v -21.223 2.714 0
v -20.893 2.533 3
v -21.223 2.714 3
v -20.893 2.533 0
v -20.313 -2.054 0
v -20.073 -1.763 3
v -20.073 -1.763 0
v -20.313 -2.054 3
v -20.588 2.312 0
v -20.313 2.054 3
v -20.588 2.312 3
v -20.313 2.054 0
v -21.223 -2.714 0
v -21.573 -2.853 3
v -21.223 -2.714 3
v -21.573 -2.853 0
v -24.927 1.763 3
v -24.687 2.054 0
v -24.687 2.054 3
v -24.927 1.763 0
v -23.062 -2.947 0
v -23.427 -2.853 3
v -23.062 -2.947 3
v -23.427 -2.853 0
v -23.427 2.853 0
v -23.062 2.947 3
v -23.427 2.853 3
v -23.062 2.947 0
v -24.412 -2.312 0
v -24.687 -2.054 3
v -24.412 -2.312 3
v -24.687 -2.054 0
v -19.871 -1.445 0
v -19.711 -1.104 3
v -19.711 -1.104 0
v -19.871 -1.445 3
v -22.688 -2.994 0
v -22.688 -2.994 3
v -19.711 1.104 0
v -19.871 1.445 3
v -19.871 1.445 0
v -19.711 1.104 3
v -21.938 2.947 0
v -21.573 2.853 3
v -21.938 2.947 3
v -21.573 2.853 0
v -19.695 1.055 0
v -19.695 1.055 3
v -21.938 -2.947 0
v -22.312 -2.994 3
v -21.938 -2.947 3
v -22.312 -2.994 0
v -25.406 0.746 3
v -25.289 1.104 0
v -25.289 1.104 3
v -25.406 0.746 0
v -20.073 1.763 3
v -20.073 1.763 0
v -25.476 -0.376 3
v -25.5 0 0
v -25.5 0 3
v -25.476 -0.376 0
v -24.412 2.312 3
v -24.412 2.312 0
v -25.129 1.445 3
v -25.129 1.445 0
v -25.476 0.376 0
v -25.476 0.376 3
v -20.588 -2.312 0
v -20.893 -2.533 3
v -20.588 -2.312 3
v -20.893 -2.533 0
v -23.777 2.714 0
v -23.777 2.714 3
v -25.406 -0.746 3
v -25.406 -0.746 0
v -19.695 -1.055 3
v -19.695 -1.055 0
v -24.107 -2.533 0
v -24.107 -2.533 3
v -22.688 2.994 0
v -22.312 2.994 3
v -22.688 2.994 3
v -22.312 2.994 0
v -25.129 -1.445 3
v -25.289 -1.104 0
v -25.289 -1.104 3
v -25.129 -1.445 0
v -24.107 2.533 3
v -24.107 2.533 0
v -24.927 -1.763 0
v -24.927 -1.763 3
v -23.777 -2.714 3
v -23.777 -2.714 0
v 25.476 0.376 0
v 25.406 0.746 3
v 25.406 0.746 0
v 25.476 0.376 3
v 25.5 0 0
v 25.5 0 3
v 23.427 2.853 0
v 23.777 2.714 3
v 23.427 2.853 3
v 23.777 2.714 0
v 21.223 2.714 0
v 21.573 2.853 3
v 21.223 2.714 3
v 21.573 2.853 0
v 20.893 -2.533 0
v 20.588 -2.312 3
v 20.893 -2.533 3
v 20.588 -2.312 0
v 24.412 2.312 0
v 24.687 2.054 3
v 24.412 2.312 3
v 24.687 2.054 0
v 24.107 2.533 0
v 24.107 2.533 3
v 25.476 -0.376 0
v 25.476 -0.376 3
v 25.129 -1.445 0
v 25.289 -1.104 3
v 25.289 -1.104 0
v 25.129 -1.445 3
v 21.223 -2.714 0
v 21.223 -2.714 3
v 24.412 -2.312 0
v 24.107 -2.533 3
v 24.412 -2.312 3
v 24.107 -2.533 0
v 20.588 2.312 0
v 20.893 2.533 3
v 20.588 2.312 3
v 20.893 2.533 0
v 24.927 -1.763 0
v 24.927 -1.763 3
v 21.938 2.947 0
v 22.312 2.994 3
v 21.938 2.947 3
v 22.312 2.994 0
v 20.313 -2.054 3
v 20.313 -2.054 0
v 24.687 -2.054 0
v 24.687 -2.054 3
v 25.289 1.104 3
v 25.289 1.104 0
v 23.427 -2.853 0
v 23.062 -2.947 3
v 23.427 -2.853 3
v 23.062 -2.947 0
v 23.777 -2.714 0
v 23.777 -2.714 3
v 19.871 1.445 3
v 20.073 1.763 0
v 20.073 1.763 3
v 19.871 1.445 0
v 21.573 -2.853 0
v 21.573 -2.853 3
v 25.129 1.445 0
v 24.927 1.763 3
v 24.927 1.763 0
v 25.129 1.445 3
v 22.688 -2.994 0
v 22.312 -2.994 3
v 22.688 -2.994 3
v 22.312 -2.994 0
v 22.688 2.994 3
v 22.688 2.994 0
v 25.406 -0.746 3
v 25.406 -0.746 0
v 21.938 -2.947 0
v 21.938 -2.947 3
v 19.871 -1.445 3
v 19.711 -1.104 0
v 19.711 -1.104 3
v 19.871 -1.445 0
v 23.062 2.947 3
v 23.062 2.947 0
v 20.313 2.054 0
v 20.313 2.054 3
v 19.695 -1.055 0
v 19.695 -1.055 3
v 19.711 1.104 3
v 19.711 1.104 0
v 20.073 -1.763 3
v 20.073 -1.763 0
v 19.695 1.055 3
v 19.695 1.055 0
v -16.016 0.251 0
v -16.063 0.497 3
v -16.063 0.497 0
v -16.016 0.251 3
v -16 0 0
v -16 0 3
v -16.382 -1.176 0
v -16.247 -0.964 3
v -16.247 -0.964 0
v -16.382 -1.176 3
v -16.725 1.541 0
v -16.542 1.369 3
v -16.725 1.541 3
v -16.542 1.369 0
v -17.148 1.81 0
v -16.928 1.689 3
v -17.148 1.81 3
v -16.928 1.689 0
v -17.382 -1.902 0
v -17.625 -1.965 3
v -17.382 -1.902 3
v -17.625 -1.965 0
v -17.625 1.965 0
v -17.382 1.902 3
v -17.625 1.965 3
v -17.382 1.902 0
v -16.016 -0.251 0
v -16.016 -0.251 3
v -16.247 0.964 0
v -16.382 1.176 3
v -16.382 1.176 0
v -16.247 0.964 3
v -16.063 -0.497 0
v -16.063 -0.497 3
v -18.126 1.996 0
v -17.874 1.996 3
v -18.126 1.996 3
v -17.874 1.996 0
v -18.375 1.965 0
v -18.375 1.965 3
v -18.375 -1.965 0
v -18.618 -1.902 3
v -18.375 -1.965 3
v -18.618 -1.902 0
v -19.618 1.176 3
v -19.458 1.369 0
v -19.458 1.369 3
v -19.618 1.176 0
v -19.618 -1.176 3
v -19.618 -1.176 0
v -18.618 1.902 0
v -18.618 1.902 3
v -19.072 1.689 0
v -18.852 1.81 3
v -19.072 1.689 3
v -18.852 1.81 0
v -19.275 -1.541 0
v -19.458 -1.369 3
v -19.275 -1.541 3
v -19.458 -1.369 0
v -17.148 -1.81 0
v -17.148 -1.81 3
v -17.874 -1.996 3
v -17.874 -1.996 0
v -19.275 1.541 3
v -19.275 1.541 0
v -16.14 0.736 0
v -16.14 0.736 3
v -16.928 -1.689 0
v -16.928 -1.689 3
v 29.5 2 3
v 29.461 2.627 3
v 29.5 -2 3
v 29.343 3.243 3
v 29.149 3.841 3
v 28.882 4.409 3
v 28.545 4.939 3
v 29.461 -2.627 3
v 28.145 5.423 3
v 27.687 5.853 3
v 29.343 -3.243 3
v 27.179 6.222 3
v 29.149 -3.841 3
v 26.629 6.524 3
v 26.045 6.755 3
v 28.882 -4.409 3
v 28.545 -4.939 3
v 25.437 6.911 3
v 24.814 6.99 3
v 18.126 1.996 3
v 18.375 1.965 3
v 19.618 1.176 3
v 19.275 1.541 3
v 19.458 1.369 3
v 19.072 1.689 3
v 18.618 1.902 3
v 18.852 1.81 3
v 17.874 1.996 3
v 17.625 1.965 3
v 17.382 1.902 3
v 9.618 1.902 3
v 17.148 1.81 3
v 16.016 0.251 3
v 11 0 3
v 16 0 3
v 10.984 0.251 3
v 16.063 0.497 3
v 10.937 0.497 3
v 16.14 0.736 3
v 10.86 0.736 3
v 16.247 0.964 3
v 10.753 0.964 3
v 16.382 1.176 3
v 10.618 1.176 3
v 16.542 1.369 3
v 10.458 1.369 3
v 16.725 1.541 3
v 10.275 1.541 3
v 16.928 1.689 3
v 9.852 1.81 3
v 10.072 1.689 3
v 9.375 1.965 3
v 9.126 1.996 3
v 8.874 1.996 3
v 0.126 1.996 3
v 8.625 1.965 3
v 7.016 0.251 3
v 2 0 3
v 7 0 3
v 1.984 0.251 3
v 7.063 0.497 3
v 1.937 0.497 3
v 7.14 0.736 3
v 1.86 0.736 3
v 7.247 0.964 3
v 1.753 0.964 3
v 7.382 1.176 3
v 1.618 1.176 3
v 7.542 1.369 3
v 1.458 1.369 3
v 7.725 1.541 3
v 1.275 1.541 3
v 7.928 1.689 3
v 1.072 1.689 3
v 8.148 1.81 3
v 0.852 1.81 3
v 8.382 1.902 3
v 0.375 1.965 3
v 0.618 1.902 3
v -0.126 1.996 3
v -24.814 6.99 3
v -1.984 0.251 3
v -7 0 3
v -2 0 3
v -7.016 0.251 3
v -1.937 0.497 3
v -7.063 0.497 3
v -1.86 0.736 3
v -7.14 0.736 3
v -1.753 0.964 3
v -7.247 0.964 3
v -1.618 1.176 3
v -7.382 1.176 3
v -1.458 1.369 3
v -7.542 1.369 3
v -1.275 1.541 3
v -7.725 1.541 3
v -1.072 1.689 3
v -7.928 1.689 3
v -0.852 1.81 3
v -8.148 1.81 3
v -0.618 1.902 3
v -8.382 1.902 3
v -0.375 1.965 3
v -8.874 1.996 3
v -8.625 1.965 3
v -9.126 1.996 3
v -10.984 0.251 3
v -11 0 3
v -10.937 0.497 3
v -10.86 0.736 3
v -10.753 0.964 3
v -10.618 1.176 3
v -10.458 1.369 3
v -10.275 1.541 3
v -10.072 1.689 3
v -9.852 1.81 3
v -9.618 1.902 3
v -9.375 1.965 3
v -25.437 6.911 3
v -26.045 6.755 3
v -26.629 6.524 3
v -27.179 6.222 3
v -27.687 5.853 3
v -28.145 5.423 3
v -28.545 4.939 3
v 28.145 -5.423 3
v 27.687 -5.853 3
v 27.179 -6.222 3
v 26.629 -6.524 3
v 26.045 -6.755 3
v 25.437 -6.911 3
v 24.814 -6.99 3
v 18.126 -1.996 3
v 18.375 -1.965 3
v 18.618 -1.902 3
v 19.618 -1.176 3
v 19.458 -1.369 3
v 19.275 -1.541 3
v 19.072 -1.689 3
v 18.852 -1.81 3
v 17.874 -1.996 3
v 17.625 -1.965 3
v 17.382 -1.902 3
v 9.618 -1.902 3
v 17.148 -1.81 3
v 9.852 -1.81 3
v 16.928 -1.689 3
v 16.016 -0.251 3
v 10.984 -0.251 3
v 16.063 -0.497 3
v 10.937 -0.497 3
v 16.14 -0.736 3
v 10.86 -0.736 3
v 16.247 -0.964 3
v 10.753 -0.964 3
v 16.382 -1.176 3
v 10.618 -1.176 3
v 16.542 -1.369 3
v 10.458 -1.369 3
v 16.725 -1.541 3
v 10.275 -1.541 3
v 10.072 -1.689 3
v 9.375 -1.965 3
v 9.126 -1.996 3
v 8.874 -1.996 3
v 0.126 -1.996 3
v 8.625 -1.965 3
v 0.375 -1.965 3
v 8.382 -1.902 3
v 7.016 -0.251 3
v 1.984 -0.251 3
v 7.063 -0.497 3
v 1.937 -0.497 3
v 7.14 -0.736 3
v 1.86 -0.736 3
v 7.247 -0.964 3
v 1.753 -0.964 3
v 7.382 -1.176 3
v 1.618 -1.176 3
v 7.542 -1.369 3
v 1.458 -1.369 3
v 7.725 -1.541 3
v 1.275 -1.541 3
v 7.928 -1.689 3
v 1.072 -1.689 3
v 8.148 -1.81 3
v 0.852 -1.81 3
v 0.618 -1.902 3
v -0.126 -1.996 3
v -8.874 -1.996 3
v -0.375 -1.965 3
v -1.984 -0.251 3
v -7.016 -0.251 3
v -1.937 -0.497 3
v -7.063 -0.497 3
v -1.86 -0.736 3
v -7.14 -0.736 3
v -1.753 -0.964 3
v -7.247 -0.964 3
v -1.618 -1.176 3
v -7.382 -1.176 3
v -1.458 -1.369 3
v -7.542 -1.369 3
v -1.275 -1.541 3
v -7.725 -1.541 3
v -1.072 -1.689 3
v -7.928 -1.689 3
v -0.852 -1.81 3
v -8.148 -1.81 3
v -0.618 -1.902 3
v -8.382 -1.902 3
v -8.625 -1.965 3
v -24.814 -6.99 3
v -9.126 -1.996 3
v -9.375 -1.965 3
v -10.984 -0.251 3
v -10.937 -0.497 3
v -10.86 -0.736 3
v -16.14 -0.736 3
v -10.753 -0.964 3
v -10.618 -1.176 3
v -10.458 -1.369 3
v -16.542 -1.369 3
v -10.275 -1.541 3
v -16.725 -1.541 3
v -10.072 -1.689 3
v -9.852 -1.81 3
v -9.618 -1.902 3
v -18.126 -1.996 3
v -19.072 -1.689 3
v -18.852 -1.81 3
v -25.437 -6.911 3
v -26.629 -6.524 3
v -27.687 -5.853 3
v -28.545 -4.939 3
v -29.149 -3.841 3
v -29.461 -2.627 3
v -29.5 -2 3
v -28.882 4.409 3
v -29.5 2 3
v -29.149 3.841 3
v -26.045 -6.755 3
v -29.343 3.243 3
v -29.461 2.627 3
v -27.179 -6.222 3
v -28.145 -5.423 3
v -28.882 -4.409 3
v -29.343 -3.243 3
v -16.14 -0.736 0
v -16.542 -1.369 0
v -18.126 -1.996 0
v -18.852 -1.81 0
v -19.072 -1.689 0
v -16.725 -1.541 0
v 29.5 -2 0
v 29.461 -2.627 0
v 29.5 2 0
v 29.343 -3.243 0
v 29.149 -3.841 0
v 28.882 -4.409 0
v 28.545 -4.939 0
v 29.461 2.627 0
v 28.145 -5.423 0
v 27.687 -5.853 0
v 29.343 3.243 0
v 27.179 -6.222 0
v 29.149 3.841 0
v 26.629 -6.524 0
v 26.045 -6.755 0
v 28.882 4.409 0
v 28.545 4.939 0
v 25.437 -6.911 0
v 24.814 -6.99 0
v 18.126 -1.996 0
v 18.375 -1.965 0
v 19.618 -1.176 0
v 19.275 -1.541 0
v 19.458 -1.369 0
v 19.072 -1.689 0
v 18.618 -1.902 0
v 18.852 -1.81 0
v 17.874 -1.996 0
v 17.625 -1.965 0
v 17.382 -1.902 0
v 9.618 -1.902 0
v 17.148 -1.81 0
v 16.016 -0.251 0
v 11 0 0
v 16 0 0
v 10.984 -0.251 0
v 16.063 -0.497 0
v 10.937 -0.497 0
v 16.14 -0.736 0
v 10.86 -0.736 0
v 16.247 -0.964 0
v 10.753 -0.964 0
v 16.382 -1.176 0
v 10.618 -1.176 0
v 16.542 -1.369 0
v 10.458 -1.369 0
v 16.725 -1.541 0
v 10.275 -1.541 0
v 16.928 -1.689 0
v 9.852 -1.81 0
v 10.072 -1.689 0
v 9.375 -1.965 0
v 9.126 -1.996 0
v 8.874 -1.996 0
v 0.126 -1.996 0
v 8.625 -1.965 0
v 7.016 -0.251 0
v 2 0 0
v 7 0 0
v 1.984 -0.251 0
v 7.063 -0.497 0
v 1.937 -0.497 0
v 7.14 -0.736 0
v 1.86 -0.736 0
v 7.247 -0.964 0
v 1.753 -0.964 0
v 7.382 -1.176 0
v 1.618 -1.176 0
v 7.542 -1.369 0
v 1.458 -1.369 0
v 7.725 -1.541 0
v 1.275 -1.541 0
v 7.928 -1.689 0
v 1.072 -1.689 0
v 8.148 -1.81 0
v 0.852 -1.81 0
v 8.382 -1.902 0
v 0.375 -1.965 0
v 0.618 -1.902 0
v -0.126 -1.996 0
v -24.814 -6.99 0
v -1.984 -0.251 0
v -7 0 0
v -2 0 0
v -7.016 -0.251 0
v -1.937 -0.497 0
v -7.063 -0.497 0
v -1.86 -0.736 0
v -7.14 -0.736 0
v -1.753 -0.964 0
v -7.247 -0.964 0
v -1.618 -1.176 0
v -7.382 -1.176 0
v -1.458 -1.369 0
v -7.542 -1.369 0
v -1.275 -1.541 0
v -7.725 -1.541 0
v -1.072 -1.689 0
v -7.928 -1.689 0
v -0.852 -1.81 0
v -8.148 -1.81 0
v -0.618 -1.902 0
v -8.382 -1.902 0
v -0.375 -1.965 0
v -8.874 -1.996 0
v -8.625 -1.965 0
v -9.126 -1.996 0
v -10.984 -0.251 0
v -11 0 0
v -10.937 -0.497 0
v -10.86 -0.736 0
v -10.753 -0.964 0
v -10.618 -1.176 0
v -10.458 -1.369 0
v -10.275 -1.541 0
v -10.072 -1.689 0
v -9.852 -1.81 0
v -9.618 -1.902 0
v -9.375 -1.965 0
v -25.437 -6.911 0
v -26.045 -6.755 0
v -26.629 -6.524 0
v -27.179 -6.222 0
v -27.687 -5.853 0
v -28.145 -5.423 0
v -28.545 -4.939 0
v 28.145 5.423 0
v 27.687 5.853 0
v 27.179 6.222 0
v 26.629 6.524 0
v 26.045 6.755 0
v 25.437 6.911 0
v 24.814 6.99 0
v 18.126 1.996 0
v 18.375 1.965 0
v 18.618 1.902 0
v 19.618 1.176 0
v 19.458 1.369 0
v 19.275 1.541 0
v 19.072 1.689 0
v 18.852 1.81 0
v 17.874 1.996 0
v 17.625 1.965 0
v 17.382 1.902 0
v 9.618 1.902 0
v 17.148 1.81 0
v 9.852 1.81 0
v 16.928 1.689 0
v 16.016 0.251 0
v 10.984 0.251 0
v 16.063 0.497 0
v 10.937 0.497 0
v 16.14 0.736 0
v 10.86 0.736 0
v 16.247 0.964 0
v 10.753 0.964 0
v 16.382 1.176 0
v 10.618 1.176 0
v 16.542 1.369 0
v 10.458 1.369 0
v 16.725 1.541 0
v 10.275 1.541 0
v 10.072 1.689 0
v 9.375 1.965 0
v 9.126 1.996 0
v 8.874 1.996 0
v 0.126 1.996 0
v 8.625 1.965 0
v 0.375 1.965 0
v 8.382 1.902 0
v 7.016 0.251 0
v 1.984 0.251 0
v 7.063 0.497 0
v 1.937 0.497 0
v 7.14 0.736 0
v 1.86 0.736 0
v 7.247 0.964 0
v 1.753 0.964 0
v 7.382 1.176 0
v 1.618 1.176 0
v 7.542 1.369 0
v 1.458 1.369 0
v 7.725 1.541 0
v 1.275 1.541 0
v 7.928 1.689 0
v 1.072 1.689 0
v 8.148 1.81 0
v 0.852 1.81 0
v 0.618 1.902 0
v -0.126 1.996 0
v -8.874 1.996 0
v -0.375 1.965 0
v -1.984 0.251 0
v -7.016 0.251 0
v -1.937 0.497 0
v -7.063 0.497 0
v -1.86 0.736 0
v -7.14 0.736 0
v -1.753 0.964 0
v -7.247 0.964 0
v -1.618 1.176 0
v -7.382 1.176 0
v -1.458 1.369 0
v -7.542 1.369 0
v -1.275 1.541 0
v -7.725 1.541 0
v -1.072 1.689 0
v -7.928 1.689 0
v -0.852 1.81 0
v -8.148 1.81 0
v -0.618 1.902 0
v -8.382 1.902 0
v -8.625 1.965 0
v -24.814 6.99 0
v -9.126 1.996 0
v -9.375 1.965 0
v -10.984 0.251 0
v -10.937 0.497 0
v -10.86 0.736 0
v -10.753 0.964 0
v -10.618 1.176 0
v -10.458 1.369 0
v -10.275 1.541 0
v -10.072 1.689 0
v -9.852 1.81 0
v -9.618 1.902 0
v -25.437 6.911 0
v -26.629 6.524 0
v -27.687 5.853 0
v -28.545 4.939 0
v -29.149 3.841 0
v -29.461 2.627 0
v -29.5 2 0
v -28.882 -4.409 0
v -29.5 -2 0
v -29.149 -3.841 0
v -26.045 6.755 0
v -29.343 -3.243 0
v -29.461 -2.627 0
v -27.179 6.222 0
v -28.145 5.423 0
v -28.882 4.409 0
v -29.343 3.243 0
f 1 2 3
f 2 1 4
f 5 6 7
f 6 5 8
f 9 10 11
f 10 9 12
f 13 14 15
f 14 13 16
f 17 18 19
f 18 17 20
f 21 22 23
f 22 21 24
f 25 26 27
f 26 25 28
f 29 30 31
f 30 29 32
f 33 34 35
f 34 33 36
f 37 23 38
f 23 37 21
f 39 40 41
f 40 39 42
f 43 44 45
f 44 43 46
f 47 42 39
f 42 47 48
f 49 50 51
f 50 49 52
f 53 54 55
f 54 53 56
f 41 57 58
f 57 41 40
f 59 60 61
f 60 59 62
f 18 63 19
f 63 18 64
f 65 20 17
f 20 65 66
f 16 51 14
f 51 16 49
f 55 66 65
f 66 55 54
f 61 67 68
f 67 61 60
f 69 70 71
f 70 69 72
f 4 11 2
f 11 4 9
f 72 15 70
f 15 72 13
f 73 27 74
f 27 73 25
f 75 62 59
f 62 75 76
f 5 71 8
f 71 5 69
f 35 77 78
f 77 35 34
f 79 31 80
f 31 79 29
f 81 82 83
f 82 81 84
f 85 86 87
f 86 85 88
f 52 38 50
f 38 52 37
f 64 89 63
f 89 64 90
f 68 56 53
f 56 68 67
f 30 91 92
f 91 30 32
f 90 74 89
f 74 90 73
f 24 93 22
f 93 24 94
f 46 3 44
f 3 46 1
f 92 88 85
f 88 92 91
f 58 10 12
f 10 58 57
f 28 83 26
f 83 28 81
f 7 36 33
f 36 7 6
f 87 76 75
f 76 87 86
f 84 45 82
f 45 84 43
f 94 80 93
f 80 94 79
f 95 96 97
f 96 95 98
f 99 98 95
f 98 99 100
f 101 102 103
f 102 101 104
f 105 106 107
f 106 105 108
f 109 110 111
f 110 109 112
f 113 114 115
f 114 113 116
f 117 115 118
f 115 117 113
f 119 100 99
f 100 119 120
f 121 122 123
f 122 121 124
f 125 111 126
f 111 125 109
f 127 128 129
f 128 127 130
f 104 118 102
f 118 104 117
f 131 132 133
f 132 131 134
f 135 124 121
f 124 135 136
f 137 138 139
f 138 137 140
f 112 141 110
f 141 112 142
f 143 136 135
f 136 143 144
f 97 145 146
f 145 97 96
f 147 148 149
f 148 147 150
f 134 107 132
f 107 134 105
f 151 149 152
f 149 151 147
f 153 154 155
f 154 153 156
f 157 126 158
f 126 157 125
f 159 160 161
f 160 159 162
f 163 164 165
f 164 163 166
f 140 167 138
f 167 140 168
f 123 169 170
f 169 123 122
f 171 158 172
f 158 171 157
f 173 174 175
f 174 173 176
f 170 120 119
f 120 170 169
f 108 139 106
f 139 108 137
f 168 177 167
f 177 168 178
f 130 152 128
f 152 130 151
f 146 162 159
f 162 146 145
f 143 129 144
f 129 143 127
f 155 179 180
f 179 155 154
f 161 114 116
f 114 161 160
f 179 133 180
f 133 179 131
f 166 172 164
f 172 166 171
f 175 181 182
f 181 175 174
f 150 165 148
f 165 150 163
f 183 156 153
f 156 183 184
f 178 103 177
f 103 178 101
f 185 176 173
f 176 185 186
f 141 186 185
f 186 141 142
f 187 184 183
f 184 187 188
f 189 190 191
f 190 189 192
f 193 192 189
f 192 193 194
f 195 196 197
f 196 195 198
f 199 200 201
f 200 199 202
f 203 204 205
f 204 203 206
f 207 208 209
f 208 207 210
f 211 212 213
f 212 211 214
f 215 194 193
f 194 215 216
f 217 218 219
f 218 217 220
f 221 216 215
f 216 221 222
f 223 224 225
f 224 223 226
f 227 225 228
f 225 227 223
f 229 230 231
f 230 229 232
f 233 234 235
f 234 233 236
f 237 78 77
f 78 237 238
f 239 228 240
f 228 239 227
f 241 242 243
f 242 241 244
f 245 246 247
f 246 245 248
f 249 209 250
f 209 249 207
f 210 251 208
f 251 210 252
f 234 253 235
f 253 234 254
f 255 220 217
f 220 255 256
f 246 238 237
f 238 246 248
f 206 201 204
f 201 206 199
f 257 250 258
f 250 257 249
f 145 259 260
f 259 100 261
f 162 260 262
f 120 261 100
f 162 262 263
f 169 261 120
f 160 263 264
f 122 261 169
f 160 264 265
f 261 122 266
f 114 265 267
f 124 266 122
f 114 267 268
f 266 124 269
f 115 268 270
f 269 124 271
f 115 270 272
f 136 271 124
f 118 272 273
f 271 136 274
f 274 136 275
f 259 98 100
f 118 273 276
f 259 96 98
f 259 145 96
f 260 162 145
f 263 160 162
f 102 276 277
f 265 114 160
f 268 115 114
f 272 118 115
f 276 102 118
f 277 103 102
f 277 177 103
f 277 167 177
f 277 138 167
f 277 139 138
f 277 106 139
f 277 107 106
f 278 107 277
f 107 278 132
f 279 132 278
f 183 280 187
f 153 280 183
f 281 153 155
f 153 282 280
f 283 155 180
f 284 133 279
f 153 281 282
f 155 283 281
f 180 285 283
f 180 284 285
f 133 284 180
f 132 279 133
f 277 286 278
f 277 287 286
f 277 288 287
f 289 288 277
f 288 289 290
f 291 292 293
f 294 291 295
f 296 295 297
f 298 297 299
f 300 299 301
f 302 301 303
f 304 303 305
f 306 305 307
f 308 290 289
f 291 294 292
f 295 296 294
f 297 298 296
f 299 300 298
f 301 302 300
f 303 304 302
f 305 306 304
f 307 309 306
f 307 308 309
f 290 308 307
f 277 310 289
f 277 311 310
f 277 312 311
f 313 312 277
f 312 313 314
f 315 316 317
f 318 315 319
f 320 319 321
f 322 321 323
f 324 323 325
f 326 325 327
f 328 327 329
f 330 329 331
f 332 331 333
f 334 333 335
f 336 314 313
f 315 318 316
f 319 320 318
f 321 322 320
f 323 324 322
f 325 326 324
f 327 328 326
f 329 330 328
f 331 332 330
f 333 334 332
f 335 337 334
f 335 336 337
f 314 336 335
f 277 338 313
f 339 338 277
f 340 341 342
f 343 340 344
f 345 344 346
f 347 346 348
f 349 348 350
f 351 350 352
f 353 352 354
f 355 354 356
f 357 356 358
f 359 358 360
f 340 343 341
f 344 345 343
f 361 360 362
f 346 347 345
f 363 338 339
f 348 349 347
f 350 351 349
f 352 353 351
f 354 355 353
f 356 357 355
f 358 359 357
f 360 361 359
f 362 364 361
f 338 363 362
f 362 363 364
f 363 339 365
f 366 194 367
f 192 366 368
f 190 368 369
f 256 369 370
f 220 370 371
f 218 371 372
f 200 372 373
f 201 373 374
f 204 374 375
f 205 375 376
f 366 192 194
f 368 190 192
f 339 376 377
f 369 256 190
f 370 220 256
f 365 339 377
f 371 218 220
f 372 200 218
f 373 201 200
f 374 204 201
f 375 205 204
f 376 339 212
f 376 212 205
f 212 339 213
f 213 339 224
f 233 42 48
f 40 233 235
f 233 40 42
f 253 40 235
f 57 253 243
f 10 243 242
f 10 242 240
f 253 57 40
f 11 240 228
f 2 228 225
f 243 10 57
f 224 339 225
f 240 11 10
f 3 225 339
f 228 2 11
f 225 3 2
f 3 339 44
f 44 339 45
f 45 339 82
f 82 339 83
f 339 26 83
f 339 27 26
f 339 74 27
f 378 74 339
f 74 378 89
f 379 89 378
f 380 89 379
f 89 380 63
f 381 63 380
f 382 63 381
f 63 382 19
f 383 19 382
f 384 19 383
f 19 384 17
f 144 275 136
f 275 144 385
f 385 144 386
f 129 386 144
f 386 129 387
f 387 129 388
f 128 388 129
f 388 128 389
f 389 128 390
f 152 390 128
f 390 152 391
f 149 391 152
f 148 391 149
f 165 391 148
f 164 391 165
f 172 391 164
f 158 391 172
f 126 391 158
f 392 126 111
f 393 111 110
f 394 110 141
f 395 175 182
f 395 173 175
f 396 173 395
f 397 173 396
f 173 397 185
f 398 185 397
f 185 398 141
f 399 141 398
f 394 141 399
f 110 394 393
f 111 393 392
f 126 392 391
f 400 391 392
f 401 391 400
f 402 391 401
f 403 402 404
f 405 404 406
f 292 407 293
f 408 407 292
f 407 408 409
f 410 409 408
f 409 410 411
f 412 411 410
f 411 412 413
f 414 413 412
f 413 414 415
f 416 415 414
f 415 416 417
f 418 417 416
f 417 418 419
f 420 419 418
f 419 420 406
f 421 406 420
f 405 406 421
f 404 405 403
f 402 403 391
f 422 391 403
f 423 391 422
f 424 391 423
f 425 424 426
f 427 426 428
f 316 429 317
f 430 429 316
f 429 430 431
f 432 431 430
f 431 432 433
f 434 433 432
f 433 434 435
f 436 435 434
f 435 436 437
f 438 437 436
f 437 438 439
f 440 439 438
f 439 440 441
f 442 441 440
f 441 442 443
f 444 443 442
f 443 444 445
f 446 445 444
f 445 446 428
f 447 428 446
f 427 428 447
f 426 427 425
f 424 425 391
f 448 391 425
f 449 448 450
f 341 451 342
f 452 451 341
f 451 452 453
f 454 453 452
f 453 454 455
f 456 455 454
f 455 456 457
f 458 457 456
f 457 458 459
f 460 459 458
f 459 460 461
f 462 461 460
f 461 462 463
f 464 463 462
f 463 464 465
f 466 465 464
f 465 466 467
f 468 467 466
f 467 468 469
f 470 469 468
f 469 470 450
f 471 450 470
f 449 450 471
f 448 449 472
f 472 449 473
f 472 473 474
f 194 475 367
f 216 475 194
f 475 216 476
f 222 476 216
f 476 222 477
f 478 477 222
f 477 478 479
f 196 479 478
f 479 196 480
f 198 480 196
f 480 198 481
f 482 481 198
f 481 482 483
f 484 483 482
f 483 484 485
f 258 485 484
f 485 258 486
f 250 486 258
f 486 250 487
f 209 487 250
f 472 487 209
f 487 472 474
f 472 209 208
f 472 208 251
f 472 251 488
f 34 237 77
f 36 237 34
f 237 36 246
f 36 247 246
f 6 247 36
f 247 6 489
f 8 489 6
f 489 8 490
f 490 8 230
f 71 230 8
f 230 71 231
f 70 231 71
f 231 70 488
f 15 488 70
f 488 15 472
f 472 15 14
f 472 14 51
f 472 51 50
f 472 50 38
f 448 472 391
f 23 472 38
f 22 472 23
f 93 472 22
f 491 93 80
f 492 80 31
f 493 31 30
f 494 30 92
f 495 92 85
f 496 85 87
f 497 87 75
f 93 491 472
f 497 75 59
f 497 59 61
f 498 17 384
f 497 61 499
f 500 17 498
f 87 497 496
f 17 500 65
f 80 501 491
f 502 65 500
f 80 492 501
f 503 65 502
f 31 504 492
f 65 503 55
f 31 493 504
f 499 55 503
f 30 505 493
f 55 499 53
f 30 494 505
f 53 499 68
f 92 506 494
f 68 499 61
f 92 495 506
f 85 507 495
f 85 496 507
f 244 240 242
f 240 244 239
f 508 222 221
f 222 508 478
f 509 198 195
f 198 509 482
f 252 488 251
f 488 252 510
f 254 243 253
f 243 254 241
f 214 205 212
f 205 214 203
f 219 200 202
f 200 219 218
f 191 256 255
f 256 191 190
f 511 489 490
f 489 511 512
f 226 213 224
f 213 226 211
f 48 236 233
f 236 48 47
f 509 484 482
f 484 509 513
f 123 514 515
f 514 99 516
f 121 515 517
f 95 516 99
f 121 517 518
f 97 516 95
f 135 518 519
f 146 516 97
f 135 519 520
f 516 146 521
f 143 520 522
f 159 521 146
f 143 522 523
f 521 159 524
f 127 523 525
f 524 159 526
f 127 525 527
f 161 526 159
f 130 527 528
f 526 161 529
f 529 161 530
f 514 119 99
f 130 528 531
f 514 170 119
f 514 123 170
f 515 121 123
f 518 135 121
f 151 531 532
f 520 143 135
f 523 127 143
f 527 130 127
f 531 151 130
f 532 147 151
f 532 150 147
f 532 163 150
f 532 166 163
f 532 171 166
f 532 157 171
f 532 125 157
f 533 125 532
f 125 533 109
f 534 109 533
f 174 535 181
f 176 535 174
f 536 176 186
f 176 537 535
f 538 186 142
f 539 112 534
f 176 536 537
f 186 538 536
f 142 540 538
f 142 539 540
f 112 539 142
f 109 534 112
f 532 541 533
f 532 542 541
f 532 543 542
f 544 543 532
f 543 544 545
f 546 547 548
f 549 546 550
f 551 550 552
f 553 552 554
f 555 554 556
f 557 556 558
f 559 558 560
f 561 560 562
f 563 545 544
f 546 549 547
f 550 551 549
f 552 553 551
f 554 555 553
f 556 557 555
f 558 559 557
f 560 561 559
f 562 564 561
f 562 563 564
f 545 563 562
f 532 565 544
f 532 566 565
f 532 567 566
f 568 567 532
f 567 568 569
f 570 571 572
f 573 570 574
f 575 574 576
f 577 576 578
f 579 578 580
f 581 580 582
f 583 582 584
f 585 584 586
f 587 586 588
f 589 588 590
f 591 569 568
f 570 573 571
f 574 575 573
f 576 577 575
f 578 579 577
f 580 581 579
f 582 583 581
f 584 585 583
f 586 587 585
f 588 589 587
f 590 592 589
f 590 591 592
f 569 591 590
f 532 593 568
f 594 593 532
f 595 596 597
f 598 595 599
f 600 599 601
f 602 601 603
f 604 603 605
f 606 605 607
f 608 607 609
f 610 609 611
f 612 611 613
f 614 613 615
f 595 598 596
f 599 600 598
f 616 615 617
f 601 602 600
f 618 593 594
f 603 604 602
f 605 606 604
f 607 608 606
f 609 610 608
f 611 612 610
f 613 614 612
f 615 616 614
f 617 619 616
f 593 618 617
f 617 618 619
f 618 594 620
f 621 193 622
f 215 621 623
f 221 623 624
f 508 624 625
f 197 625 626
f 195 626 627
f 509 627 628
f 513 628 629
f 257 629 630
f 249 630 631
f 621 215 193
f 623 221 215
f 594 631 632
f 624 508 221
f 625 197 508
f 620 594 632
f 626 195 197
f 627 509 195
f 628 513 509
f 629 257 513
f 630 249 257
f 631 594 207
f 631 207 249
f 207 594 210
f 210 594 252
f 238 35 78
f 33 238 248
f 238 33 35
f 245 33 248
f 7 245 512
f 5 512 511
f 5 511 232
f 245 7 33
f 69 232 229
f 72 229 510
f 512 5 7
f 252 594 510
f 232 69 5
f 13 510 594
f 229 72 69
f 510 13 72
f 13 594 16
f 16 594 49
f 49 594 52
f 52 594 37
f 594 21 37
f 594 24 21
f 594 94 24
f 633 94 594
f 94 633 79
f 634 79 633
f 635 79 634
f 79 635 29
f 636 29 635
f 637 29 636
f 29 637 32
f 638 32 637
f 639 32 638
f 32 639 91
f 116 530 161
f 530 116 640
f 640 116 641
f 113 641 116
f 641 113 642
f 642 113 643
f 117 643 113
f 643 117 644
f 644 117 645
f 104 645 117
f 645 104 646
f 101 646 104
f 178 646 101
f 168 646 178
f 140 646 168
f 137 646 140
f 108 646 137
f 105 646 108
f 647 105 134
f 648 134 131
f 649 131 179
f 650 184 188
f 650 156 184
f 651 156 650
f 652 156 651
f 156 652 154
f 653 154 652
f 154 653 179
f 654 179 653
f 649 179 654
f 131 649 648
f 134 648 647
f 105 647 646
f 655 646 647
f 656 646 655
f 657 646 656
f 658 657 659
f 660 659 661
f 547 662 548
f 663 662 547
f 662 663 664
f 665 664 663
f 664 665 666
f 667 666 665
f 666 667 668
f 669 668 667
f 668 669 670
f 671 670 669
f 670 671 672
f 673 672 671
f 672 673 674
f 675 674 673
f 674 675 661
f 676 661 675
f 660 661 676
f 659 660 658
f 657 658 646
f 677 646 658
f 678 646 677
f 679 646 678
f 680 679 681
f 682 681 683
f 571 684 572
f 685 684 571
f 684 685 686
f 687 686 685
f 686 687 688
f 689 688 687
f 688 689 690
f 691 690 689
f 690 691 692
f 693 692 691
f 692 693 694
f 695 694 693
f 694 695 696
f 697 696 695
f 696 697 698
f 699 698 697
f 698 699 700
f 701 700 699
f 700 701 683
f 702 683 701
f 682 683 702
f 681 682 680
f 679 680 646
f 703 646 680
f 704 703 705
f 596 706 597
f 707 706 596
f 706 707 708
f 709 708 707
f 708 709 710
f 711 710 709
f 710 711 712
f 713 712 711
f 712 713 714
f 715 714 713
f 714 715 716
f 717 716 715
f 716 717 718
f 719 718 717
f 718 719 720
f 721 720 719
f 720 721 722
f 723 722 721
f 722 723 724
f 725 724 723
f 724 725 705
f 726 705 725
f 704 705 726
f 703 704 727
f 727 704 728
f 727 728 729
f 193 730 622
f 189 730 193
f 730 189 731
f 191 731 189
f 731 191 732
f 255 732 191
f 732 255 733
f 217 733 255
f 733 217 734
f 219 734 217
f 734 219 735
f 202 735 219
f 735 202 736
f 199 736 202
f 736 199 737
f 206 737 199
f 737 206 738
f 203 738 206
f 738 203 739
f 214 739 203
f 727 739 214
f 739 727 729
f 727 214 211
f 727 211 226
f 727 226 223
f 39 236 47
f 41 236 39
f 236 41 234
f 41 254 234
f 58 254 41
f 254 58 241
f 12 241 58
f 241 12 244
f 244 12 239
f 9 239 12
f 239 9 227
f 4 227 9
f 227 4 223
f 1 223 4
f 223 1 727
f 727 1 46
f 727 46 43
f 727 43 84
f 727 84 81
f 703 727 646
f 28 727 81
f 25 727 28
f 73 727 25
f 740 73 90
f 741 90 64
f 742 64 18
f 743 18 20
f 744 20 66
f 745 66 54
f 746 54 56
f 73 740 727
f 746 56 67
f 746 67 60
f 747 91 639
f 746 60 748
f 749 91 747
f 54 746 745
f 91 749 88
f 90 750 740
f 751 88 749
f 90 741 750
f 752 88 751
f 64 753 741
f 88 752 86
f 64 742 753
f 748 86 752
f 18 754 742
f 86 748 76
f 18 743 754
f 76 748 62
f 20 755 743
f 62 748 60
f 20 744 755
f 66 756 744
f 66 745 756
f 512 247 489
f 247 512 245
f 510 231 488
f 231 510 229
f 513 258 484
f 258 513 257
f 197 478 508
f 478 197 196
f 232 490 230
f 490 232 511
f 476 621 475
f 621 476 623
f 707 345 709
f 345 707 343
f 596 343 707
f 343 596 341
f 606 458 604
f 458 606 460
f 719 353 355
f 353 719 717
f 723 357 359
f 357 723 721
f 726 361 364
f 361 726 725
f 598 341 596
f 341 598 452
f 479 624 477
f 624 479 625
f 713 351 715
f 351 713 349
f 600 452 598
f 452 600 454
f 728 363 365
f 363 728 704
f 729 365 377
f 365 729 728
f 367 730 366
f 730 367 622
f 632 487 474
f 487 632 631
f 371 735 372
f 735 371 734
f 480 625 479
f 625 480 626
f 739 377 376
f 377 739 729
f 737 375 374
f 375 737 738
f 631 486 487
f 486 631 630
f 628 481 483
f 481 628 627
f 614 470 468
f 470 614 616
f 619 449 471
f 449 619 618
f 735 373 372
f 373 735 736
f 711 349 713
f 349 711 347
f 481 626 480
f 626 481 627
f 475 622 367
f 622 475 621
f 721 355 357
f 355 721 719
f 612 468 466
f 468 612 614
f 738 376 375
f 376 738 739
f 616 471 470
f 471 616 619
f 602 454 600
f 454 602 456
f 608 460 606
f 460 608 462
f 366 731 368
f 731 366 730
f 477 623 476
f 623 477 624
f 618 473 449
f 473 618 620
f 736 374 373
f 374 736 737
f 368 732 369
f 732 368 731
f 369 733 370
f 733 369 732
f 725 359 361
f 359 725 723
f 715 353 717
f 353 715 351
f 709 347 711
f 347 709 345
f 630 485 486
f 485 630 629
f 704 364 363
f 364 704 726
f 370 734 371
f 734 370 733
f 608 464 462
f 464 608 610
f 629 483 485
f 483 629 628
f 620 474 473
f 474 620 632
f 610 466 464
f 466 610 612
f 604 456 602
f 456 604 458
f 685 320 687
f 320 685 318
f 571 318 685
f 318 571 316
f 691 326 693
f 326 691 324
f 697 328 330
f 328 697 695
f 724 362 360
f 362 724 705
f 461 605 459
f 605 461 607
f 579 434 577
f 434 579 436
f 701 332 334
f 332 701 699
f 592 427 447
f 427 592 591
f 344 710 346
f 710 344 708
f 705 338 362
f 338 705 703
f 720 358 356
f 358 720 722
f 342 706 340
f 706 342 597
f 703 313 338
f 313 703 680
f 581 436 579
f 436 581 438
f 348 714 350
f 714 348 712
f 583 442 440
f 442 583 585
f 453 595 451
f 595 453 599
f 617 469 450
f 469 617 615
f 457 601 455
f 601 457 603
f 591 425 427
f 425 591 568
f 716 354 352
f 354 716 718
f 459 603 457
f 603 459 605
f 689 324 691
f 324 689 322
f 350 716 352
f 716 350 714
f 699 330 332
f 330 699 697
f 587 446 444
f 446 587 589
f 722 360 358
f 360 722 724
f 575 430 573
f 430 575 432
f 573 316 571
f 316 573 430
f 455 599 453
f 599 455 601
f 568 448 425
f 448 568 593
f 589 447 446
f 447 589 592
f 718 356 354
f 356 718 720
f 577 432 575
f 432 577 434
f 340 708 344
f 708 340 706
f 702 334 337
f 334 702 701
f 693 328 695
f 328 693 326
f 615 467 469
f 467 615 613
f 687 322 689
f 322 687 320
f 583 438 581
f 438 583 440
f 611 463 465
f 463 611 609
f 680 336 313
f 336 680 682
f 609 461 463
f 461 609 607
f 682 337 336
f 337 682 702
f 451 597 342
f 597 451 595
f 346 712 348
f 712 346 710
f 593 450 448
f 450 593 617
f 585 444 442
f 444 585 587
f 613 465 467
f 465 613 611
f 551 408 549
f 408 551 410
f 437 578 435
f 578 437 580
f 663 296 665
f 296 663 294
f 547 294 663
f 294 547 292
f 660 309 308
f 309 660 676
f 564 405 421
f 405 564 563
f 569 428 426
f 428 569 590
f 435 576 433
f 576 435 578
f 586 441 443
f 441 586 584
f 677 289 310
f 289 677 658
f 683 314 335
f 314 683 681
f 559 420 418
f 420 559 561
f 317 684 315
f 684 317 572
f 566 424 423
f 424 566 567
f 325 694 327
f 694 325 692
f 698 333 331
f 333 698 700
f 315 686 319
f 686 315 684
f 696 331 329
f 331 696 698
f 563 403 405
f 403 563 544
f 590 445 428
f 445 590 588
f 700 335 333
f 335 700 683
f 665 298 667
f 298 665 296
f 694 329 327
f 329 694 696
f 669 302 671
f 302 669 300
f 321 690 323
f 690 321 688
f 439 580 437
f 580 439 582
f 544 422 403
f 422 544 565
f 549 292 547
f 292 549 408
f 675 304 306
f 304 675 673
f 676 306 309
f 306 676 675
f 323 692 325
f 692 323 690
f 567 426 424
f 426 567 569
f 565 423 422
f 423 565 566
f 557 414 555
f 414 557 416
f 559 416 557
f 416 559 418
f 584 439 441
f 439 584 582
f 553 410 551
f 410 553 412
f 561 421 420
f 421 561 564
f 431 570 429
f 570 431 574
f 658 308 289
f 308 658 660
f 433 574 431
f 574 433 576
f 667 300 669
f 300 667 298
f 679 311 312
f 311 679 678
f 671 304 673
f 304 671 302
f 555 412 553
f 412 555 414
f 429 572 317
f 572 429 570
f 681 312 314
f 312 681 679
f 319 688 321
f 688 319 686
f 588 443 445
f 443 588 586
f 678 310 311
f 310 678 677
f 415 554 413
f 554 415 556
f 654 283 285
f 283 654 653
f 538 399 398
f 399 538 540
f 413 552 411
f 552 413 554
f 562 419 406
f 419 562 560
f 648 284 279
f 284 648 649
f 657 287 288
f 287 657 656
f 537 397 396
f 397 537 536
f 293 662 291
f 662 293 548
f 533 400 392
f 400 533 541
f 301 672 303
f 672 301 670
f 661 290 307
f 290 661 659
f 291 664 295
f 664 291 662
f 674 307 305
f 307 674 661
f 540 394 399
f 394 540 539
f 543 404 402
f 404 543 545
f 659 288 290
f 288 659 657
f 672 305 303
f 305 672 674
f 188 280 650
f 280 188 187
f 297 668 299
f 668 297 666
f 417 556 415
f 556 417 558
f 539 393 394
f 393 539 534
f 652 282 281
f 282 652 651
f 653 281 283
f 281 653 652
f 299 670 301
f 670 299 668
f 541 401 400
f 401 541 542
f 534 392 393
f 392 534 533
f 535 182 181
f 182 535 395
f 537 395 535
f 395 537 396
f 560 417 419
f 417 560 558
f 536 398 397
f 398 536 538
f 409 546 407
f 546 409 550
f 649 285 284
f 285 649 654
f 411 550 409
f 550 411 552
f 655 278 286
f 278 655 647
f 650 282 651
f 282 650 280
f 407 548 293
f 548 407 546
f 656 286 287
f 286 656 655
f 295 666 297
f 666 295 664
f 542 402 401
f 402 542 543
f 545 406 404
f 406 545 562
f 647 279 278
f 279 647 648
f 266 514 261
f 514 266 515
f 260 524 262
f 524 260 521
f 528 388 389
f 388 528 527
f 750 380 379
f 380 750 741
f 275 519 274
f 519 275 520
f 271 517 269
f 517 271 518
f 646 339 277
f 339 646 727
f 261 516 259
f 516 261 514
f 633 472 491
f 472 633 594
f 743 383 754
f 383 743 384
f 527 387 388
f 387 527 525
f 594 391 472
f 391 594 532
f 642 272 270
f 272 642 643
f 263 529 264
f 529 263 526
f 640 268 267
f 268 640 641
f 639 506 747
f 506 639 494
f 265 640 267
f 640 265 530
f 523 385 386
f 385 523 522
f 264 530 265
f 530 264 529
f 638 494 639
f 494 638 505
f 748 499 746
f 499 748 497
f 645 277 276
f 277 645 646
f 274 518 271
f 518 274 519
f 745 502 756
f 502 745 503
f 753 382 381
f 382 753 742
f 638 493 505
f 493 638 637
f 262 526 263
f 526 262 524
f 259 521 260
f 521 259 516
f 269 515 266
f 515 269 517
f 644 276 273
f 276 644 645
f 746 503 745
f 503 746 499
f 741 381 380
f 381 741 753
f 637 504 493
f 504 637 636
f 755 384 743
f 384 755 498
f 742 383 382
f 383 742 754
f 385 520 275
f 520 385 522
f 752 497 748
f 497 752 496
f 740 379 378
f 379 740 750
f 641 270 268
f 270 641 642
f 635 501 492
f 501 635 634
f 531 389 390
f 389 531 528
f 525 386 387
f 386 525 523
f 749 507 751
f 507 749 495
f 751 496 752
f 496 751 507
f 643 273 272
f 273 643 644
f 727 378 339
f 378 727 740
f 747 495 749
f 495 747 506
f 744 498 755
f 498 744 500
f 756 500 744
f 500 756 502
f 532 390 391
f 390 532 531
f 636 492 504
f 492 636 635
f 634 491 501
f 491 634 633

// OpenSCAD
$fn = 50;


difference() {
	union() {
		hull() {
			translate(v = [-24.5000000000, 2.0000000000, 0]) {
				cylinder(h = 3, r = 5);
			}
			translate(v = [24.5000000000, 2.0000000000, 0]) {
				cylinder(h = 3, r = 5);
			}
			translate(v = [-24.5000000000, -2.0000000000, 0]) {
				cylinder(h = 3, r = 5);
			}
			translate(v = [24.5000000000, -2.0000000000, 0]) {
				cylinder(h = 3, r = 5);
			}
		}
	}
	union() {
		#translate(v = [-22.5000000000, 0.0000000000, -100.0000000000]) {
			cylinder(h = 200, r = 3.0000000000);
		}
		#translate(v = [-22.5000000000, 0.0000000000, -100.0000000000]) {
			cylinder(h = 200, r = 3.0000000000);
		}
		#translate(v = [22.5000000000, 0.0000000000, -100.0000000000]) {
			cylinder(h = 200, r = 3.0000000000);
		}
		#translate(v = [22.5000000000, 0.0000000000, -100.0000000000]) {
			cylinder(h = 200, r = 3.0000000000);
		}
		#translate(v = [-18.0000000000, 0, 0]) {
			cylinder(h = 3, r = 2.0000000000);
		}
		#translate(v = [-9.0000000000, 0, 0]) {
			cylinder(h = 3, r = 2.0000000000);
		}
		#cylinder(h = 3, r = 2.0000000000);
		#translate(v = [9.0000000000, 0, 0]) {
			cylinder(h = 3, r = 2.0000000000);
		}
		#translate(v = [18.0000000000, 0, 0]) {
			cylinder(h = 3, r = 2.0000000000);
		}
	}
}
